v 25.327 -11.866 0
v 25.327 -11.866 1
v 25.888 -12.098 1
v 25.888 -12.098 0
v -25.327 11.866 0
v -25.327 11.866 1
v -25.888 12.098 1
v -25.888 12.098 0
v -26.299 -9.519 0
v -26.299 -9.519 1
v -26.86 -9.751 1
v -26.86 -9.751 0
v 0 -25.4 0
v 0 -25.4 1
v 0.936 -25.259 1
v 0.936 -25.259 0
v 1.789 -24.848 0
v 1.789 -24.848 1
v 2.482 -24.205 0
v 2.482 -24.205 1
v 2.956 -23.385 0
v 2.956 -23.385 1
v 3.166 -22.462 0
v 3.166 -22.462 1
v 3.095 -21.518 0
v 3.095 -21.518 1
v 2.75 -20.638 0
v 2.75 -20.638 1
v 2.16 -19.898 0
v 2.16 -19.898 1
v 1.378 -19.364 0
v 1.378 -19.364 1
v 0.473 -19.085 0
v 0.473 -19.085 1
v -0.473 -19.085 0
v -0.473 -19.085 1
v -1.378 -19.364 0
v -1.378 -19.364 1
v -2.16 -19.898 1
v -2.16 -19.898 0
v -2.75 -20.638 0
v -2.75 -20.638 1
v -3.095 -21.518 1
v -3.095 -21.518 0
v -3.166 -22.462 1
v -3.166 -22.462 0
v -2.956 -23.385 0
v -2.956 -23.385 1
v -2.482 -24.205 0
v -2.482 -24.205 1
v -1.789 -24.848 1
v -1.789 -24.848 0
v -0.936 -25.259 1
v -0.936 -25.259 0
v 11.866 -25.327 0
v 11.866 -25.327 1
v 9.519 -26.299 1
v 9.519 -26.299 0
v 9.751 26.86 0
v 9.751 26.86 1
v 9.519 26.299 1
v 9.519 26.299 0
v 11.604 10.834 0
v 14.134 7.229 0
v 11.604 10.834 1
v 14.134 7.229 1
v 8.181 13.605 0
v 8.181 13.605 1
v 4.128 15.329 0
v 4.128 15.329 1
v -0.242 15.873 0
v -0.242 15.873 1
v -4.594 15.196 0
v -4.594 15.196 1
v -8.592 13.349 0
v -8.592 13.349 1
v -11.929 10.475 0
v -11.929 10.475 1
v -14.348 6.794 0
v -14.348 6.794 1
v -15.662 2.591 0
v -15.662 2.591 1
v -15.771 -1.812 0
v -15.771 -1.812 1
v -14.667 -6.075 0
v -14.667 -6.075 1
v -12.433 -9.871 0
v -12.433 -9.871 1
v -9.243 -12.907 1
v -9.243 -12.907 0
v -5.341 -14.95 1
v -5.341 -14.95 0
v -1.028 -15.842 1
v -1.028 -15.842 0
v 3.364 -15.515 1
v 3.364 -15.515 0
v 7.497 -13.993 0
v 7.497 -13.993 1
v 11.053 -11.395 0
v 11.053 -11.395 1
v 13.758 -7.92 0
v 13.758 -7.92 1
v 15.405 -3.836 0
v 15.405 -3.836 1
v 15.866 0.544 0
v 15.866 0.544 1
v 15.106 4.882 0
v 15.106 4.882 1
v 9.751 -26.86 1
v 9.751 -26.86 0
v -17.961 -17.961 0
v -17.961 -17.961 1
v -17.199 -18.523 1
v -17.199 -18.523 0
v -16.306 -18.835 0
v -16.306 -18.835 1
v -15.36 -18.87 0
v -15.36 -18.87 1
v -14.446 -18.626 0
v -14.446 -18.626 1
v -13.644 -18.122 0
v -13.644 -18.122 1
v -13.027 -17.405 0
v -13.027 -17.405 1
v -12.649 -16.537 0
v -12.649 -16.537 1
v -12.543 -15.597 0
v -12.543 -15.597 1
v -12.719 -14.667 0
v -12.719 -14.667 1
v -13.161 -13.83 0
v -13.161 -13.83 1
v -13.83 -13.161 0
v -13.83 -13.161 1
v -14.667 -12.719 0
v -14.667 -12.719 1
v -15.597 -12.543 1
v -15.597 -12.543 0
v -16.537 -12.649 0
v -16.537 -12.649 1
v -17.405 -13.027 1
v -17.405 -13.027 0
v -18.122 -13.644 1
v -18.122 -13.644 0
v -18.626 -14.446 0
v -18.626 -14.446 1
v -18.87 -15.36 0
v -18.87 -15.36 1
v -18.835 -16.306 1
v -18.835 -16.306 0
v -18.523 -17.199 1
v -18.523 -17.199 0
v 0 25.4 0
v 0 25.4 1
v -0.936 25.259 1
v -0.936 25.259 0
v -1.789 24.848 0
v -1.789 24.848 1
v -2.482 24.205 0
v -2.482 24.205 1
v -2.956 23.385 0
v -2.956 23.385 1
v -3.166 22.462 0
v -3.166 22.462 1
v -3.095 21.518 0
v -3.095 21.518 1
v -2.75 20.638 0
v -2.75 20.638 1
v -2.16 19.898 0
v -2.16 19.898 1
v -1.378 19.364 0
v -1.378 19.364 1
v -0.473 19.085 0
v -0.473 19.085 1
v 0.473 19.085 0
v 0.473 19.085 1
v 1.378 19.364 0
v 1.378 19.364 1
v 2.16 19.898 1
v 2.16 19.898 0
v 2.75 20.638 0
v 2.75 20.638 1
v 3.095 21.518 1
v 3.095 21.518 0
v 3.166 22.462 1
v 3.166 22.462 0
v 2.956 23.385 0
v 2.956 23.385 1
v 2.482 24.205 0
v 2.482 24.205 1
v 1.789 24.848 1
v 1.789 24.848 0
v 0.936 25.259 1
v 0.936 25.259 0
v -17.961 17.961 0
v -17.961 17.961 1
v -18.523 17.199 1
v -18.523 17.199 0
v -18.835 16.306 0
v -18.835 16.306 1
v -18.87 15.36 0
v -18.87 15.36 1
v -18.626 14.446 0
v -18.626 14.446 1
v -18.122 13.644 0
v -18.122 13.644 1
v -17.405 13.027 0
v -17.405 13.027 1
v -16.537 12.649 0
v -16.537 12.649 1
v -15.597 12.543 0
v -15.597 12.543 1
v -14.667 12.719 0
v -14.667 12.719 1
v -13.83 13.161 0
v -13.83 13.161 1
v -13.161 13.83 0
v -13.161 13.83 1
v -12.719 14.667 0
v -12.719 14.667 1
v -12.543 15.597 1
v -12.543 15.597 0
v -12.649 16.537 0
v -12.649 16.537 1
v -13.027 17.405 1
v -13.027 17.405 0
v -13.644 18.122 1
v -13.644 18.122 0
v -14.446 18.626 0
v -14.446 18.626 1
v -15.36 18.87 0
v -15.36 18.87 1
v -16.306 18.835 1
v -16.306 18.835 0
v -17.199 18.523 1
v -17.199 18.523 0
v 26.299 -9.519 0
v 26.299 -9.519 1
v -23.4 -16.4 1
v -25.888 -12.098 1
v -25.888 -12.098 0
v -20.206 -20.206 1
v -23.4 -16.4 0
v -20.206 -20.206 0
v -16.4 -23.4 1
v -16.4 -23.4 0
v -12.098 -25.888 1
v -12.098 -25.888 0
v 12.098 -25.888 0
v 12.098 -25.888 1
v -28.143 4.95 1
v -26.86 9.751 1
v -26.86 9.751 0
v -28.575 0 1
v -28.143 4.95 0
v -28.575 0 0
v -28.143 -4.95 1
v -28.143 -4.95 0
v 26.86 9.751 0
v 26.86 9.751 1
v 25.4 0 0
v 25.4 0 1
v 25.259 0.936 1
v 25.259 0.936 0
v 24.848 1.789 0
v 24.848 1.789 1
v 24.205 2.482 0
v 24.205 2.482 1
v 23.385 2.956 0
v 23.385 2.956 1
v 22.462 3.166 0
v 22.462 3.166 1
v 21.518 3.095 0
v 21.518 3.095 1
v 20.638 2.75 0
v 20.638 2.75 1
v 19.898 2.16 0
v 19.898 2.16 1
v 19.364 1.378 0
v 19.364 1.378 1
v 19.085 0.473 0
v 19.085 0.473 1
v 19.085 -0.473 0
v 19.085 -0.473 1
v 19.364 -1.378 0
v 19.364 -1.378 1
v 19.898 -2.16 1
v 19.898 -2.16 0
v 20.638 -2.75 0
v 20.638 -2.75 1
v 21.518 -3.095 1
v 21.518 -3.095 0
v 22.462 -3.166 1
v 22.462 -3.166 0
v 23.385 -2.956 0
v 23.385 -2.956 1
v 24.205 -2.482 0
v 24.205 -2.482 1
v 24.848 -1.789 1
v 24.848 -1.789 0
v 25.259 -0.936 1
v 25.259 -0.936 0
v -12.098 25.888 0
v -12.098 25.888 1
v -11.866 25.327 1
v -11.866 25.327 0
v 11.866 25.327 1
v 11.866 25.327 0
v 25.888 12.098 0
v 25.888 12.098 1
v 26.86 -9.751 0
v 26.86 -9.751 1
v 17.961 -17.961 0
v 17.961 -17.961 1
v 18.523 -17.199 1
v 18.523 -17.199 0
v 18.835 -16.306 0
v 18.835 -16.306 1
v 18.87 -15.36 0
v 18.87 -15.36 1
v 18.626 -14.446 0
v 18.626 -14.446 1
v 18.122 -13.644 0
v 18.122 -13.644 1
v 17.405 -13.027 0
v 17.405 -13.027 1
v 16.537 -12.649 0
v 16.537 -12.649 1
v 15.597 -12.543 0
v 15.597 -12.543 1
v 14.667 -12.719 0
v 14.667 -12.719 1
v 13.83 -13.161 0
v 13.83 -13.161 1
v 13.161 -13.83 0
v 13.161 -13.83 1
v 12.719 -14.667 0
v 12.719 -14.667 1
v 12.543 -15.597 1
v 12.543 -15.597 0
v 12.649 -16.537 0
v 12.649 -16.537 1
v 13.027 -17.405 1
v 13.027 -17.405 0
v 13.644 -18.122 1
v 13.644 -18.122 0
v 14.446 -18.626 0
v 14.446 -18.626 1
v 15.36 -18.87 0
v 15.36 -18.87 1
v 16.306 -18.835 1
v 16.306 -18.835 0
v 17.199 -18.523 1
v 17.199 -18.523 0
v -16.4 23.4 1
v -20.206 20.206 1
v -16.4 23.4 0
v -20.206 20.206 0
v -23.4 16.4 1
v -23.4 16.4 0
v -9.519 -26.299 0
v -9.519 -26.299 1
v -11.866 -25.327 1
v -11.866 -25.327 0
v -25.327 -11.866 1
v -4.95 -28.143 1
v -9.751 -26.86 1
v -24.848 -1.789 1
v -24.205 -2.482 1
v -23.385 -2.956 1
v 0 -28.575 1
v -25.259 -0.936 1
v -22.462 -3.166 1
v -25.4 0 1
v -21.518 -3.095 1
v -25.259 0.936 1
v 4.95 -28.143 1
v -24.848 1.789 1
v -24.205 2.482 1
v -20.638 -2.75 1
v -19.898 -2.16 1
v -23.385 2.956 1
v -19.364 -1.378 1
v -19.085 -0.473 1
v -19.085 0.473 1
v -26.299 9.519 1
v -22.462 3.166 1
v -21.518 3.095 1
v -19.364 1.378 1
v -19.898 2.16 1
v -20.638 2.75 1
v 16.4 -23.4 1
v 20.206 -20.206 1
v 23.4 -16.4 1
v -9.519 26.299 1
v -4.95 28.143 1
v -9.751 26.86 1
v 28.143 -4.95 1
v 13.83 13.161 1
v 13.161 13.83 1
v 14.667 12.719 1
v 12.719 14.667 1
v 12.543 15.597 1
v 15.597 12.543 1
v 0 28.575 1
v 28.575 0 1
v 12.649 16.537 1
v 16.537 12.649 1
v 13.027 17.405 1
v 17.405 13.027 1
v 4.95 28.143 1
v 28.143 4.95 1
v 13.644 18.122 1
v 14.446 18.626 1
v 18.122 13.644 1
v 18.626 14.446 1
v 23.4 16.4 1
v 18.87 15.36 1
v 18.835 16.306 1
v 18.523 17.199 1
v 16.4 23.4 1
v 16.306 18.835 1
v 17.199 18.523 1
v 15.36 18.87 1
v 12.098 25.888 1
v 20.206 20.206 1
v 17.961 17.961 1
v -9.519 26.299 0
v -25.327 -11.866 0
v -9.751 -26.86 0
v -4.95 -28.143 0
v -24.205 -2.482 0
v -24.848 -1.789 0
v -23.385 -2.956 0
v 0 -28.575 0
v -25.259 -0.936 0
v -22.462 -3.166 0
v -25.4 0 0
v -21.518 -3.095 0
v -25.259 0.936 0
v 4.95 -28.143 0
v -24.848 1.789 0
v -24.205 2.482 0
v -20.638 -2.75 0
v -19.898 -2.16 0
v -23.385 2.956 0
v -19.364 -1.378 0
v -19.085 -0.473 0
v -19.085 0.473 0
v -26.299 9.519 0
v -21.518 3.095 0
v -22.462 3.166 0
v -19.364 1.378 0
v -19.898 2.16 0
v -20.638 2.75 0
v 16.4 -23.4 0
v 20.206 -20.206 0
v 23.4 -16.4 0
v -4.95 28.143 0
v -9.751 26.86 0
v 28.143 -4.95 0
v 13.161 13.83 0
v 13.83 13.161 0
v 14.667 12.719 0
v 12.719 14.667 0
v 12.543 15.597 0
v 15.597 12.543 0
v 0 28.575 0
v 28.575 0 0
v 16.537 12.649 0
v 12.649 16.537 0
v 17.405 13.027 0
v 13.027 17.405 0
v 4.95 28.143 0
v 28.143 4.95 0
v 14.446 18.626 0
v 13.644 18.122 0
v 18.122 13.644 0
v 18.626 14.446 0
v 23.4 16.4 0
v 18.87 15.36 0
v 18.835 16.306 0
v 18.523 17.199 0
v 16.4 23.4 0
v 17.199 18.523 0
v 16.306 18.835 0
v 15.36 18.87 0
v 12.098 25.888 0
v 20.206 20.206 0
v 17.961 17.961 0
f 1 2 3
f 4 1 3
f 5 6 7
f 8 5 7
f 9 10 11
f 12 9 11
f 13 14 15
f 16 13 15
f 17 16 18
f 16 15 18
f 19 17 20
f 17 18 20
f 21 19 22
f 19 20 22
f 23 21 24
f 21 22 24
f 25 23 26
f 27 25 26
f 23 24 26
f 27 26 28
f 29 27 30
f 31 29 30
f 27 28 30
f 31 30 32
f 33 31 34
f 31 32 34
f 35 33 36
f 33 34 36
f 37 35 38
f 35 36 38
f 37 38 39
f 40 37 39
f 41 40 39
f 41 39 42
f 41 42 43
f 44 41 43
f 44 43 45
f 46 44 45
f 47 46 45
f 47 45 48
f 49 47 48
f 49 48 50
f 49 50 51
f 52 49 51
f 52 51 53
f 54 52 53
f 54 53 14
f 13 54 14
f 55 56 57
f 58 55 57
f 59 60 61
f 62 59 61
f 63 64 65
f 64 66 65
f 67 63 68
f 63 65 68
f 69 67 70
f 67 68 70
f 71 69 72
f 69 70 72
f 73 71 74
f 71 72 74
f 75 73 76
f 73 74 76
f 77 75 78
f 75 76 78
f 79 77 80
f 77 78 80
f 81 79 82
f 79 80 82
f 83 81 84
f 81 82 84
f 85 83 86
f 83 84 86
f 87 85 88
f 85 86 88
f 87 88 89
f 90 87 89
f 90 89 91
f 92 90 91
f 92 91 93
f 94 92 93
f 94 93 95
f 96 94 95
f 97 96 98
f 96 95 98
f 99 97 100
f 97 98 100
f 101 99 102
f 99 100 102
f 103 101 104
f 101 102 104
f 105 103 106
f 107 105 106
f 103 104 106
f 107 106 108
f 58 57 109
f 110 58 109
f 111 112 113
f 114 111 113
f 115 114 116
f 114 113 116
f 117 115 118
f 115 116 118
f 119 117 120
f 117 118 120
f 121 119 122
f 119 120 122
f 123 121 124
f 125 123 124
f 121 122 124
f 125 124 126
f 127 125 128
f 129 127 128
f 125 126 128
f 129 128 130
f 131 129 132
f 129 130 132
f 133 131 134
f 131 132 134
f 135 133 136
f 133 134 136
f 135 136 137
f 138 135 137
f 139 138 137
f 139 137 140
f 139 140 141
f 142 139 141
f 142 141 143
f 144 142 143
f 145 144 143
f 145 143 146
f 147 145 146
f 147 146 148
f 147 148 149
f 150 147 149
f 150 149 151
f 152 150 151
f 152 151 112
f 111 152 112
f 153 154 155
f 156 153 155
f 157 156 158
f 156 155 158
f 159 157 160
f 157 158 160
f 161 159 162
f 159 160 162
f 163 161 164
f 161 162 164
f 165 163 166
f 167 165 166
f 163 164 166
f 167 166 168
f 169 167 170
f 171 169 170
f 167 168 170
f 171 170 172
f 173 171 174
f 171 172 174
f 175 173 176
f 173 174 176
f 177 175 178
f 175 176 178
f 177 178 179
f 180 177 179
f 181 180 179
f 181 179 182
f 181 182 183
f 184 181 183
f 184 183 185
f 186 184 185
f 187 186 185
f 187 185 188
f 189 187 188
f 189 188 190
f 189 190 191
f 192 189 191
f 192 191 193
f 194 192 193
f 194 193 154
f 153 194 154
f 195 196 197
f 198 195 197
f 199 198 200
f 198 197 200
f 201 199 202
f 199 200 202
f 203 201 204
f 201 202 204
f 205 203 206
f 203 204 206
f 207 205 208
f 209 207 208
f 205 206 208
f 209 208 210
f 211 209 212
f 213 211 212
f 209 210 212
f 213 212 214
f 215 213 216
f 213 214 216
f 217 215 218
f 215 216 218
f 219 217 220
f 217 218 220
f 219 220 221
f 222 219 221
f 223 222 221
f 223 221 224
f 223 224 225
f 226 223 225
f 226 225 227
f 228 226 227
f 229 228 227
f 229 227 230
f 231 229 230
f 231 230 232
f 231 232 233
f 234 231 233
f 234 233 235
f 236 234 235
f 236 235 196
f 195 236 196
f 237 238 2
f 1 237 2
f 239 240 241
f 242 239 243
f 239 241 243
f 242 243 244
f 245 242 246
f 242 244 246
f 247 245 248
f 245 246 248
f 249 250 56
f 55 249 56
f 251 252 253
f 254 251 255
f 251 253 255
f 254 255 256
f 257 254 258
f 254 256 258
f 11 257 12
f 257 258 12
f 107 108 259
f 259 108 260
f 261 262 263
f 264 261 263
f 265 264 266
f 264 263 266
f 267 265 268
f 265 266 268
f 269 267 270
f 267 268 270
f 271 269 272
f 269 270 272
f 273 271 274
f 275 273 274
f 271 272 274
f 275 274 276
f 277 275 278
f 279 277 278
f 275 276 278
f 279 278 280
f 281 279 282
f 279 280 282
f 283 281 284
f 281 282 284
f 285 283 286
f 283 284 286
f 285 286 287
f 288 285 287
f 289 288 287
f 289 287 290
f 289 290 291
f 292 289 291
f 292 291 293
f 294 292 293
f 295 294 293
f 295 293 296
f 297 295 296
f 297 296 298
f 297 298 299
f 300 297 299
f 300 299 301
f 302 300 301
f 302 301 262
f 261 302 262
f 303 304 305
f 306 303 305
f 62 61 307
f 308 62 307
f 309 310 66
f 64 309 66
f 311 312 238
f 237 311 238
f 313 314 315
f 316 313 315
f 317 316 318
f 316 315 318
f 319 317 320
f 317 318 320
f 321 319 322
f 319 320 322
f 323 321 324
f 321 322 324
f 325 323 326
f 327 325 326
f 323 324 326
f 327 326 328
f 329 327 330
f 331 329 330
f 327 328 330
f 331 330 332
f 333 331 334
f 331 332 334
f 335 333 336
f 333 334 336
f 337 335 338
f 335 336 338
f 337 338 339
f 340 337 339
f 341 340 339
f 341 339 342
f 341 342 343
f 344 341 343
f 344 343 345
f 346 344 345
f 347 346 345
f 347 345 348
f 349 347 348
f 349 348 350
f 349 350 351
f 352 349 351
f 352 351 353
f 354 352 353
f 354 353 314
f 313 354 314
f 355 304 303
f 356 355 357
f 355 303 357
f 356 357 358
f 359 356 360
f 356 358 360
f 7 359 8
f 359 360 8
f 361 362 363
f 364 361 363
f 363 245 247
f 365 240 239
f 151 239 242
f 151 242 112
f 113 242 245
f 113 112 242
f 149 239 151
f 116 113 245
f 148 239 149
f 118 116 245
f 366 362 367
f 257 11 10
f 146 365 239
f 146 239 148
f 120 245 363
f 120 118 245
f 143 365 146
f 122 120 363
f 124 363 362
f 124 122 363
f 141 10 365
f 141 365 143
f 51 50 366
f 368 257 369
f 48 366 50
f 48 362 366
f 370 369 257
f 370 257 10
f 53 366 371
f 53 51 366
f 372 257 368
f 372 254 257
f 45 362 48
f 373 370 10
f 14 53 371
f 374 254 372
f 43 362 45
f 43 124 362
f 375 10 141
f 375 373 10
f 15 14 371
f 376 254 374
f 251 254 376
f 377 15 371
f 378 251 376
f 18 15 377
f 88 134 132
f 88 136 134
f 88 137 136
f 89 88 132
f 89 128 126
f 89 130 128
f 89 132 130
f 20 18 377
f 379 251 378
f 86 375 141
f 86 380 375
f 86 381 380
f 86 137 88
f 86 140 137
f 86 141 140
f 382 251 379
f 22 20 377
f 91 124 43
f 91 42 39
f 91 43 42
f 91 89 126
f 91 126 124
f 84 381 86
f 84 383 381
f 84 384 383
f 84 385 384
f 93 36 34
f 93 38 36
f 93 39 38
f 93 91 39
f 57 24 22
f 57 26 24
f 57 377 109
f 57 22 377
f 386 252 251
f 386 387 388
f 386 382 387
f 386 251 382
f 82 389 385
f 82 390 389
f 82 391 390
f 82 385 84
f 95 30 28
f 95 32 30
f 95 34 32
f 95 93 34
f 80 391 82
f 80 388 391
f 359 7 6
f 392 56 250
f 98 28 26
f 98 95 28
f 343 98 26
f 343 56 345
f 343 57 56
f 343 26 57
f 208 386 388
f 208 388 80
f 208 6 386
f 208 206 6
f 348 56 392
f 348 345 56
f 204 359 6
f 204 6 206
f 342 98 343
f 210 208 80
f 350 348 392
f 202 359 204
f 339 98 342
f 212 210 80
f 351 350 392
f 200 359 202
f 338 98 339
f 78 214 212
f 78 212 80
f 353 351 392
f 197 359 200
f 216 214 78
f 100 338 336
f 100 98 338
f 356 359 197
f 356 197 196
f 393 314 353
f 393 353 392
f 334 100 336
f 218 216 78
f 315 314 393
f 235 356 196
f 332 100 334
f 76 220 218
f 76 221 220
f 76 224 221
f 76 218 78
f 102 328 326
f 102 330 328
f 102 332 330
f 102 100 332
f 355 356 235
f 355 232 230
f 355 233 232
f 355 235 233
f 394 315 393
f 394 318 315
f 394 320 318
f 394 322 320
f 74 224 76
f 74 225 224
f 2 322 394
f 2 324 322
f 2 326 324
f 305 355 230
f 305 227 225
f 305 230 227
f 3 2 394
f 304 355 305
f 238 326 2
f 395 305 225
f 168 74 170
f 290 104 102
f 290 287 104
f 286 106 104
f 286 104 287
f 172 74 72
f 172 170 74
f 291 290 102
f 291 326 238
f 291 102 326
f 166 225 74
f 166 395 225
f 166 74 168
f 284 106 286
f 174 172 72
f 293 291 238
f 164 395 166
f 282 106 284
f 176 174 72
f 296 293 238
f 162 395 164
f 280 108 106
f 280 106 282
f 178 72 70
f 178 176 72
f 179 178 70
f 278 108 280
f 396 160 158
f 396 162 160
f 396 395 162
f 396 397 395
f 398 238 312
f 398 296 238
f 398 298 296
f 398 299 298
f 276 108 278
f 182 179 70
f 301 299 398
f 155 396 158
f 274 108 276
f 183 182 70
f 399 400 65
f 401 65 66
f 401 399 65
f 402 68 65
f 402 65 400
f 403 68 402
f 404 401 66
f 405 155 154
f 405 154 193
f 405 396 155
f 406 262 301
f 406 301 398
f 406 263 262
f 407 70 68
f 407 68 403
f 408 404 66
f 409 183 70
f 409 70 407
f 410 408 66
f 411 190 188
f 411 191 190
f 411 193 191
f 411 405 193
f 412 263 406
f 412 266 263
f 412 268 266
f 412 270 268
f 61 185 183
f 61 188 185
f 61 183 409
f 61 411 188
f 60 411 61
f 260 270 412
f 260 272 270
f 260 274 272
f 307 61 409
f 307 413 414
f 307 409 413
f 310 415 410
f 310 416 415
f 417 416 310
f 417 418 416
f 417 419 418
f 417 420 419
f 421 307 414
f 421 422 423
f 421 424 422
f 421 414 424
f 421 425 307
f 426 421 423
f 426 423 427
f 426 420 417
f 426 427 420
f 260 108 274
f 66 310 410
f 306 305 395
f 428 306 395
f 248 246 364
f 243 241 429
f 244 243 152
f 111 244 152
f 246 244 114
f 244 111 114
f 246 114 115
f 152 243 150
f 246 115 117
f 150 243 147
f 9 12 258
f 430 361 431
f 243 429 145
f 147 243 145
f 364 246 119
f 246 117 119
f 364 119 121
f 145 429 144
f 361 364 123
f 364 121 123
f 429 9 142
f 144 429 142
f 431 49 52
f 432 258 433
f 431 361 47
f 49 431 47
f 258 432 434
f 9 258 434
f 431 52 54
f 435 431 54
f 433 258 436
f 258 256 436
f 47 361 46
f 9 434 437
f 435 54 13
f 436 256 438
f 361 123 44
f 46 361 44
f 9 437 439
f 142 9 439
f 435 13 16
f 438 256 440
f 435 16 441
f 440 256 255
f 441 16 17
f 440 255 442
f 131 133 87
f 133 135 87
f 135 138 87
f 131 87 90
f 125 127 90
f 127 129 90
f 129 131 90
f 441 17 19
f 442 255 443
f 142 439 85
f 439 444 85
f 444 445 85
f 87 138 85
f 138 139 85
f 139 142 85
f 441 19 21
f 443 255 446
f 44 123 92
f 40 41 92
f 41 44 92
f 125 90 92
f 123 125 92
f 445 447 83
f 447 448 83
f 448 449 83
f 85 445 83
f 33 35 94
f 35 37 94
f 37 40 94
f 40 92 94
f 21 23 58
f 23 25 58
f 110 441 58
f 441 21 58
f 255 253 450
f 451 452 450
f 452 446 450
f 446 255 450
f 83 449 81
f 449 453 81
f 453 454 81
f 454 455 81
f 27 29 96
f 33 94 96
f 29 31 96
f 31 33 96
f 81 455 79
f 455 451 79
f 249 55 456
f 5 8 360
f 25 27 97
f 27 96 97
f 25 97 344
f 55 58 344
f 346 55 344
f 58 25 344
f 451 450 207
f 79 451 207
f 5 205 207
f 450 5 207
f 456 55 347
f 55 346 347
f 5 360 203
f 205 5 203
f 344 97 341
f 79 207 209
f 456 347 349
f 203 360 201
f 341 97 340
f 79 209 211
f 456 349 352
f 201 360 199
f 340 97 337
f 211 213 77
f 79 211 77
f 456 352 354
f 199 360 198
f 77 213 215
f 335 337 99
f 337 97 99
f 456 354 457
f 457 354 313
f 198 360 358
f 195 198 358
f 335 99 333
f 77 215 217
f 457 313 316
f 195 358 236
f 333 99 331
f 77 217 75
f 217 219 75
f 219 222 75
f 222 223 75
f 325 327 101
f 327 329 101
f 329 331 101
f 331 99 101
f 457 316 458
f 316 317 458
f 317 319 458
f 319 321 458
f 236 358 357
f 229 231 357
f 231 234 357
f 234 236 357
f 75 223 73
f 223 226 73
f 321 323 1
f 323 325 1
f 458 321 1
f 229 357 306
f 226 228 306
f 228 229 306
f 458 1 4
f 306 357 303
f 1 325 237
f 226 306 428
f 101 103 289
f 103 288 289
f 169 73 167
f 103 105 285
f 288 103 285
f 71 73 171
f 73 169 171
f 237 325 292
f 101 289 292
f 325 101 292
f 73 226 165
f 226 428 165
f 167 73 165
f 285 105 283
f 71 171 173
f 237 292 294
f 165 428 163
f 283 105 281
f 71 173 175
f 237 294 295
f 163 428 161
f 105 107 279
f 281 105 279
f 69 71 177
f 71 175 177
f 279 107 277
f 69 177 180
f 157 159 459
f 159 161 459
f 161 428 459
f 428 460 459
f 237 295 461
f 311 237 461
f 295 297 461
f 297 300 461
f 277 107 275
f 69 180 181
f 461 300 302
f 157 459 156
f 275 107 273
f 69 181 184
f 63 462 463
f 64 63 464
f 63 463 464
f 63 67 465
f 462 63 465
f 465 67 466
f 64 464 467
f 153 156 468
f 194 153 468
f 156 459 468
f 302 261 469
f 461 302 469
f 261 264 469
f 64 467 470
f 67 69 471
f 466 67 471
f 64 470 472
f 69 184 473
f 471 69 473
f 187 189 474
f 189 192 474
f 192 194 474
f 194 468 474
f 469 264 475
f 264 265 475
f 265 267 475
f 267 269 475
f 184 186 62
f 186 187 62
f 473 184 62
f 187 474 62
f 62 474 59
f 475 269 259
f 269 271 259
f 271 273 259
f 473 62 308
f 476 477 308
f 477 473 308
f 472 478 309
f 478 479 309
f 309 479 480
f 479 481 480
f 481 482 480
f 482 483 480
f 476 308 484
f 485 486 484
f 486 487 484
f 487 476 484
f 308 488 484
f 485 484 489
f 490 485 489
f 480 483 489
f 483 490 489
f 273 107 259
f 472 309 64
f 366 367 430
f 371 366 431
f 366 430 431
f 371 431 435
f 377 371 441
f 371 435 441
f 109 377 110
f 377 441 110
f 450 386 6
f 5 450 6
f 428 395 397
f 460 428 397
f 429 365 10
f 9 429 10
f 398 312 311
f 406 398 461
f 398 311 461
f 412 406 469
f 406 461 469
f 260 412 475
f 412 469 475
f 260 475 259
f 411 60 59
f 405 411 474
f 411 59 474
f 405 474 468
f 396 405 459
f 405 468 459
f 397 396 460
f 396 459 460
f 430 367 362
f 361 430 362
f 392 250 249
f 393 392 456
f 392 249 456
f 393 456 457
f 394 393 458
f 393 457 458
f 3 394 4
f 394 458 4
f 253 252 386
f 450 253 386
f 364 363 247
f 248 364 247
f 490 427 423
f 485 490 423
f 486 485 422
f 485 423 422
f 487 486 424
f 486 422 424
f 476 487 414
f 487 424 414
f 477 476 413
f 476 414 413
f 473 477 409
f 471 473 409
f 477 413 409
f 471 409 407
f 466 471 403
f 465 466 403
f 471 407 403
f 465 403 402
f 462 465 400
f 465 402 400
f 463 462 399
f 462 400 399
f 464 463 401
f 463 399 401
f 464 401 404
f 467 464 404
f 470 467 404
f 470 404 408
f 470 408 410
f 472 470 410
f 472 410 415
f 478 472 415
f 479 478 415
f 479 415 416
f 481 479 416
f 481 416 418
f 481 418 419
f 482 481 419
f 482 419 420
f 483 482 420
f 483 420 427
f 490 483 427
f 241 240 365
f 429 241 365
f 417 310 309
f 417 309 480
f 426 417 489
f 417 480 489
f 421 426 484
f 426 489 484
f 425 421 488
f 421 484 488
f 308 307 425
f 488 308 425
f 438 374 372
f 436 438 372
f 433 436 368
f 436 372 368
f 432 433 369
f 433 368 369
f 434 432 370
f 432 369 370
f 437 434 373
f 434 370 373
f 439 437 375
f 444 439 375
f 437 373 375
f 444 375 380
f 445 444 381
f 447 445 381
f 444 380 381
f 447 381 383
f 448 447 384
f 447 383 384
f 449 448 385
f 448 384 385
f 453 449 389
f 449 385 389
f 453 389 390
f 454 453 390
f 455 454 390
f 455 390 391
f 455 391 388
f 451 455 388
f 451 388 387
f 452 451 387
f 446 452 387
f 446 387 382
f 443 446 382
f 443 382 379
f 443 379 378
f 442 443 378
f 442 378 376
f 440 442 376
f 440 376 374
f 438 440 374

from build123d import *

# Parameters (mm, degrees)
SKETCH4_R           = 28.575
BOSS_EXTRUDE2_DEPTH = 1
SKETCH5_R           = 15.875
CUT_EXTRUDE5_DEPTH  = 2
SKETCH6_R           = 3.175
CUT_EXTRUDE6_DEPTH  = 2
CIRPATTERN1_COUNT   = 8
CUT_EXTRUDE11_DEPTH = 2


with BuildPart() as part:
    # Sketch4 → Boss-Extrude2 (new body)
    with BuildSketch(Plane.XY):
        Circle(SKETCH4_R)
    extrude(amount=BOSS_EXTRUDE2_DEPTH)

    # Sketch5 → Cut-Extrude5 (cut, through all)
    with BuildSketch(Plane.XY.offset(1)):
        Circle(SKETCH5_R)
    extrude(amount=-CUT_EXTRUDE5_DEPTH, mode=Mode.SUBTRACT)

    # Sketch6 → Cut-Extrude6 (cut, through all)
    with BuildSketch(Plane.XY.offset(1)):
        with Locations((22.225, 0)):
            Circle(SKETCH6_R)
    cut_extrude6 = extrude(amount=-CUT_EXTRUDE6_DEPTH, mode=Mode.SUBTRACT)

    # CirPattern1: Cut-Extrude6 ×8 about axis
    cirpattern1_axis = Axis((0, 0, 0), (0, 0, 1))
    for i in range(1, CIRPATTERN1_COUNT):
        add(cut_extrude6.rotate(cirpattern1_axis, i * 360 / CIRPATTERN1_COUNT), mode=Mode.SUBTRACT)

    # Sketch8 → Cut-Extrude11 (cut, through all)
    with BuildSketch(Plane.XY.offset(1)):
        Polygon((29.433830701, 13.566529963), (10.660598601, 5.790402618), (11.632614519, 3.443748605), (30.405846619, 11.219875951), align=None)
        Polygon((12.351510066, 26.500513186), (10.004856053, 27.472529104), (9.518848094, 26.299202097), (11.865502107, 25.327186179), align=None)
        Polygon((-10.004856053, 27.472529104), (-12.351510066, 26.500513186), (-11.865502107, 25.327186179), (-9.518848094, 26.299202097), align=None)
        Polygon((-26.500513186, 12.351510066), (-27.472529104, 10.004856053), (-26.299202097, 9.518848094), (-25.327186179, 11.865502107), align=None)
        Polygon((-27.472529104, -10.004856053), (-26.500513186, -12.351510066), (-25.327186179, -11.865502107), (-26.299202097, -9.518848094), align=None)
        Polygon((-12.351510066, -26.500513186), (-10.004856053, -27.472529104), (-9.518848094, -26.299202097), (-11.865502107, -25.327186179), align=None)
        Polygon((10.004856053, -27.472529104), (12.351510066, -26.500513186), (11.865502107, -25.327186179), (9.518848094, -26.299202097), align=None)
        Polygon((26.500513186, -12.351510066), (27.472529104, -10.004856053), (26.299202097, -9.518848094), (25.327186179, -11.865502107), align=None)
    extrude(amount=-CUT_EXTRUDE11_DEPTH, mode=Mode.SUBTRACT)


solid = part.part
